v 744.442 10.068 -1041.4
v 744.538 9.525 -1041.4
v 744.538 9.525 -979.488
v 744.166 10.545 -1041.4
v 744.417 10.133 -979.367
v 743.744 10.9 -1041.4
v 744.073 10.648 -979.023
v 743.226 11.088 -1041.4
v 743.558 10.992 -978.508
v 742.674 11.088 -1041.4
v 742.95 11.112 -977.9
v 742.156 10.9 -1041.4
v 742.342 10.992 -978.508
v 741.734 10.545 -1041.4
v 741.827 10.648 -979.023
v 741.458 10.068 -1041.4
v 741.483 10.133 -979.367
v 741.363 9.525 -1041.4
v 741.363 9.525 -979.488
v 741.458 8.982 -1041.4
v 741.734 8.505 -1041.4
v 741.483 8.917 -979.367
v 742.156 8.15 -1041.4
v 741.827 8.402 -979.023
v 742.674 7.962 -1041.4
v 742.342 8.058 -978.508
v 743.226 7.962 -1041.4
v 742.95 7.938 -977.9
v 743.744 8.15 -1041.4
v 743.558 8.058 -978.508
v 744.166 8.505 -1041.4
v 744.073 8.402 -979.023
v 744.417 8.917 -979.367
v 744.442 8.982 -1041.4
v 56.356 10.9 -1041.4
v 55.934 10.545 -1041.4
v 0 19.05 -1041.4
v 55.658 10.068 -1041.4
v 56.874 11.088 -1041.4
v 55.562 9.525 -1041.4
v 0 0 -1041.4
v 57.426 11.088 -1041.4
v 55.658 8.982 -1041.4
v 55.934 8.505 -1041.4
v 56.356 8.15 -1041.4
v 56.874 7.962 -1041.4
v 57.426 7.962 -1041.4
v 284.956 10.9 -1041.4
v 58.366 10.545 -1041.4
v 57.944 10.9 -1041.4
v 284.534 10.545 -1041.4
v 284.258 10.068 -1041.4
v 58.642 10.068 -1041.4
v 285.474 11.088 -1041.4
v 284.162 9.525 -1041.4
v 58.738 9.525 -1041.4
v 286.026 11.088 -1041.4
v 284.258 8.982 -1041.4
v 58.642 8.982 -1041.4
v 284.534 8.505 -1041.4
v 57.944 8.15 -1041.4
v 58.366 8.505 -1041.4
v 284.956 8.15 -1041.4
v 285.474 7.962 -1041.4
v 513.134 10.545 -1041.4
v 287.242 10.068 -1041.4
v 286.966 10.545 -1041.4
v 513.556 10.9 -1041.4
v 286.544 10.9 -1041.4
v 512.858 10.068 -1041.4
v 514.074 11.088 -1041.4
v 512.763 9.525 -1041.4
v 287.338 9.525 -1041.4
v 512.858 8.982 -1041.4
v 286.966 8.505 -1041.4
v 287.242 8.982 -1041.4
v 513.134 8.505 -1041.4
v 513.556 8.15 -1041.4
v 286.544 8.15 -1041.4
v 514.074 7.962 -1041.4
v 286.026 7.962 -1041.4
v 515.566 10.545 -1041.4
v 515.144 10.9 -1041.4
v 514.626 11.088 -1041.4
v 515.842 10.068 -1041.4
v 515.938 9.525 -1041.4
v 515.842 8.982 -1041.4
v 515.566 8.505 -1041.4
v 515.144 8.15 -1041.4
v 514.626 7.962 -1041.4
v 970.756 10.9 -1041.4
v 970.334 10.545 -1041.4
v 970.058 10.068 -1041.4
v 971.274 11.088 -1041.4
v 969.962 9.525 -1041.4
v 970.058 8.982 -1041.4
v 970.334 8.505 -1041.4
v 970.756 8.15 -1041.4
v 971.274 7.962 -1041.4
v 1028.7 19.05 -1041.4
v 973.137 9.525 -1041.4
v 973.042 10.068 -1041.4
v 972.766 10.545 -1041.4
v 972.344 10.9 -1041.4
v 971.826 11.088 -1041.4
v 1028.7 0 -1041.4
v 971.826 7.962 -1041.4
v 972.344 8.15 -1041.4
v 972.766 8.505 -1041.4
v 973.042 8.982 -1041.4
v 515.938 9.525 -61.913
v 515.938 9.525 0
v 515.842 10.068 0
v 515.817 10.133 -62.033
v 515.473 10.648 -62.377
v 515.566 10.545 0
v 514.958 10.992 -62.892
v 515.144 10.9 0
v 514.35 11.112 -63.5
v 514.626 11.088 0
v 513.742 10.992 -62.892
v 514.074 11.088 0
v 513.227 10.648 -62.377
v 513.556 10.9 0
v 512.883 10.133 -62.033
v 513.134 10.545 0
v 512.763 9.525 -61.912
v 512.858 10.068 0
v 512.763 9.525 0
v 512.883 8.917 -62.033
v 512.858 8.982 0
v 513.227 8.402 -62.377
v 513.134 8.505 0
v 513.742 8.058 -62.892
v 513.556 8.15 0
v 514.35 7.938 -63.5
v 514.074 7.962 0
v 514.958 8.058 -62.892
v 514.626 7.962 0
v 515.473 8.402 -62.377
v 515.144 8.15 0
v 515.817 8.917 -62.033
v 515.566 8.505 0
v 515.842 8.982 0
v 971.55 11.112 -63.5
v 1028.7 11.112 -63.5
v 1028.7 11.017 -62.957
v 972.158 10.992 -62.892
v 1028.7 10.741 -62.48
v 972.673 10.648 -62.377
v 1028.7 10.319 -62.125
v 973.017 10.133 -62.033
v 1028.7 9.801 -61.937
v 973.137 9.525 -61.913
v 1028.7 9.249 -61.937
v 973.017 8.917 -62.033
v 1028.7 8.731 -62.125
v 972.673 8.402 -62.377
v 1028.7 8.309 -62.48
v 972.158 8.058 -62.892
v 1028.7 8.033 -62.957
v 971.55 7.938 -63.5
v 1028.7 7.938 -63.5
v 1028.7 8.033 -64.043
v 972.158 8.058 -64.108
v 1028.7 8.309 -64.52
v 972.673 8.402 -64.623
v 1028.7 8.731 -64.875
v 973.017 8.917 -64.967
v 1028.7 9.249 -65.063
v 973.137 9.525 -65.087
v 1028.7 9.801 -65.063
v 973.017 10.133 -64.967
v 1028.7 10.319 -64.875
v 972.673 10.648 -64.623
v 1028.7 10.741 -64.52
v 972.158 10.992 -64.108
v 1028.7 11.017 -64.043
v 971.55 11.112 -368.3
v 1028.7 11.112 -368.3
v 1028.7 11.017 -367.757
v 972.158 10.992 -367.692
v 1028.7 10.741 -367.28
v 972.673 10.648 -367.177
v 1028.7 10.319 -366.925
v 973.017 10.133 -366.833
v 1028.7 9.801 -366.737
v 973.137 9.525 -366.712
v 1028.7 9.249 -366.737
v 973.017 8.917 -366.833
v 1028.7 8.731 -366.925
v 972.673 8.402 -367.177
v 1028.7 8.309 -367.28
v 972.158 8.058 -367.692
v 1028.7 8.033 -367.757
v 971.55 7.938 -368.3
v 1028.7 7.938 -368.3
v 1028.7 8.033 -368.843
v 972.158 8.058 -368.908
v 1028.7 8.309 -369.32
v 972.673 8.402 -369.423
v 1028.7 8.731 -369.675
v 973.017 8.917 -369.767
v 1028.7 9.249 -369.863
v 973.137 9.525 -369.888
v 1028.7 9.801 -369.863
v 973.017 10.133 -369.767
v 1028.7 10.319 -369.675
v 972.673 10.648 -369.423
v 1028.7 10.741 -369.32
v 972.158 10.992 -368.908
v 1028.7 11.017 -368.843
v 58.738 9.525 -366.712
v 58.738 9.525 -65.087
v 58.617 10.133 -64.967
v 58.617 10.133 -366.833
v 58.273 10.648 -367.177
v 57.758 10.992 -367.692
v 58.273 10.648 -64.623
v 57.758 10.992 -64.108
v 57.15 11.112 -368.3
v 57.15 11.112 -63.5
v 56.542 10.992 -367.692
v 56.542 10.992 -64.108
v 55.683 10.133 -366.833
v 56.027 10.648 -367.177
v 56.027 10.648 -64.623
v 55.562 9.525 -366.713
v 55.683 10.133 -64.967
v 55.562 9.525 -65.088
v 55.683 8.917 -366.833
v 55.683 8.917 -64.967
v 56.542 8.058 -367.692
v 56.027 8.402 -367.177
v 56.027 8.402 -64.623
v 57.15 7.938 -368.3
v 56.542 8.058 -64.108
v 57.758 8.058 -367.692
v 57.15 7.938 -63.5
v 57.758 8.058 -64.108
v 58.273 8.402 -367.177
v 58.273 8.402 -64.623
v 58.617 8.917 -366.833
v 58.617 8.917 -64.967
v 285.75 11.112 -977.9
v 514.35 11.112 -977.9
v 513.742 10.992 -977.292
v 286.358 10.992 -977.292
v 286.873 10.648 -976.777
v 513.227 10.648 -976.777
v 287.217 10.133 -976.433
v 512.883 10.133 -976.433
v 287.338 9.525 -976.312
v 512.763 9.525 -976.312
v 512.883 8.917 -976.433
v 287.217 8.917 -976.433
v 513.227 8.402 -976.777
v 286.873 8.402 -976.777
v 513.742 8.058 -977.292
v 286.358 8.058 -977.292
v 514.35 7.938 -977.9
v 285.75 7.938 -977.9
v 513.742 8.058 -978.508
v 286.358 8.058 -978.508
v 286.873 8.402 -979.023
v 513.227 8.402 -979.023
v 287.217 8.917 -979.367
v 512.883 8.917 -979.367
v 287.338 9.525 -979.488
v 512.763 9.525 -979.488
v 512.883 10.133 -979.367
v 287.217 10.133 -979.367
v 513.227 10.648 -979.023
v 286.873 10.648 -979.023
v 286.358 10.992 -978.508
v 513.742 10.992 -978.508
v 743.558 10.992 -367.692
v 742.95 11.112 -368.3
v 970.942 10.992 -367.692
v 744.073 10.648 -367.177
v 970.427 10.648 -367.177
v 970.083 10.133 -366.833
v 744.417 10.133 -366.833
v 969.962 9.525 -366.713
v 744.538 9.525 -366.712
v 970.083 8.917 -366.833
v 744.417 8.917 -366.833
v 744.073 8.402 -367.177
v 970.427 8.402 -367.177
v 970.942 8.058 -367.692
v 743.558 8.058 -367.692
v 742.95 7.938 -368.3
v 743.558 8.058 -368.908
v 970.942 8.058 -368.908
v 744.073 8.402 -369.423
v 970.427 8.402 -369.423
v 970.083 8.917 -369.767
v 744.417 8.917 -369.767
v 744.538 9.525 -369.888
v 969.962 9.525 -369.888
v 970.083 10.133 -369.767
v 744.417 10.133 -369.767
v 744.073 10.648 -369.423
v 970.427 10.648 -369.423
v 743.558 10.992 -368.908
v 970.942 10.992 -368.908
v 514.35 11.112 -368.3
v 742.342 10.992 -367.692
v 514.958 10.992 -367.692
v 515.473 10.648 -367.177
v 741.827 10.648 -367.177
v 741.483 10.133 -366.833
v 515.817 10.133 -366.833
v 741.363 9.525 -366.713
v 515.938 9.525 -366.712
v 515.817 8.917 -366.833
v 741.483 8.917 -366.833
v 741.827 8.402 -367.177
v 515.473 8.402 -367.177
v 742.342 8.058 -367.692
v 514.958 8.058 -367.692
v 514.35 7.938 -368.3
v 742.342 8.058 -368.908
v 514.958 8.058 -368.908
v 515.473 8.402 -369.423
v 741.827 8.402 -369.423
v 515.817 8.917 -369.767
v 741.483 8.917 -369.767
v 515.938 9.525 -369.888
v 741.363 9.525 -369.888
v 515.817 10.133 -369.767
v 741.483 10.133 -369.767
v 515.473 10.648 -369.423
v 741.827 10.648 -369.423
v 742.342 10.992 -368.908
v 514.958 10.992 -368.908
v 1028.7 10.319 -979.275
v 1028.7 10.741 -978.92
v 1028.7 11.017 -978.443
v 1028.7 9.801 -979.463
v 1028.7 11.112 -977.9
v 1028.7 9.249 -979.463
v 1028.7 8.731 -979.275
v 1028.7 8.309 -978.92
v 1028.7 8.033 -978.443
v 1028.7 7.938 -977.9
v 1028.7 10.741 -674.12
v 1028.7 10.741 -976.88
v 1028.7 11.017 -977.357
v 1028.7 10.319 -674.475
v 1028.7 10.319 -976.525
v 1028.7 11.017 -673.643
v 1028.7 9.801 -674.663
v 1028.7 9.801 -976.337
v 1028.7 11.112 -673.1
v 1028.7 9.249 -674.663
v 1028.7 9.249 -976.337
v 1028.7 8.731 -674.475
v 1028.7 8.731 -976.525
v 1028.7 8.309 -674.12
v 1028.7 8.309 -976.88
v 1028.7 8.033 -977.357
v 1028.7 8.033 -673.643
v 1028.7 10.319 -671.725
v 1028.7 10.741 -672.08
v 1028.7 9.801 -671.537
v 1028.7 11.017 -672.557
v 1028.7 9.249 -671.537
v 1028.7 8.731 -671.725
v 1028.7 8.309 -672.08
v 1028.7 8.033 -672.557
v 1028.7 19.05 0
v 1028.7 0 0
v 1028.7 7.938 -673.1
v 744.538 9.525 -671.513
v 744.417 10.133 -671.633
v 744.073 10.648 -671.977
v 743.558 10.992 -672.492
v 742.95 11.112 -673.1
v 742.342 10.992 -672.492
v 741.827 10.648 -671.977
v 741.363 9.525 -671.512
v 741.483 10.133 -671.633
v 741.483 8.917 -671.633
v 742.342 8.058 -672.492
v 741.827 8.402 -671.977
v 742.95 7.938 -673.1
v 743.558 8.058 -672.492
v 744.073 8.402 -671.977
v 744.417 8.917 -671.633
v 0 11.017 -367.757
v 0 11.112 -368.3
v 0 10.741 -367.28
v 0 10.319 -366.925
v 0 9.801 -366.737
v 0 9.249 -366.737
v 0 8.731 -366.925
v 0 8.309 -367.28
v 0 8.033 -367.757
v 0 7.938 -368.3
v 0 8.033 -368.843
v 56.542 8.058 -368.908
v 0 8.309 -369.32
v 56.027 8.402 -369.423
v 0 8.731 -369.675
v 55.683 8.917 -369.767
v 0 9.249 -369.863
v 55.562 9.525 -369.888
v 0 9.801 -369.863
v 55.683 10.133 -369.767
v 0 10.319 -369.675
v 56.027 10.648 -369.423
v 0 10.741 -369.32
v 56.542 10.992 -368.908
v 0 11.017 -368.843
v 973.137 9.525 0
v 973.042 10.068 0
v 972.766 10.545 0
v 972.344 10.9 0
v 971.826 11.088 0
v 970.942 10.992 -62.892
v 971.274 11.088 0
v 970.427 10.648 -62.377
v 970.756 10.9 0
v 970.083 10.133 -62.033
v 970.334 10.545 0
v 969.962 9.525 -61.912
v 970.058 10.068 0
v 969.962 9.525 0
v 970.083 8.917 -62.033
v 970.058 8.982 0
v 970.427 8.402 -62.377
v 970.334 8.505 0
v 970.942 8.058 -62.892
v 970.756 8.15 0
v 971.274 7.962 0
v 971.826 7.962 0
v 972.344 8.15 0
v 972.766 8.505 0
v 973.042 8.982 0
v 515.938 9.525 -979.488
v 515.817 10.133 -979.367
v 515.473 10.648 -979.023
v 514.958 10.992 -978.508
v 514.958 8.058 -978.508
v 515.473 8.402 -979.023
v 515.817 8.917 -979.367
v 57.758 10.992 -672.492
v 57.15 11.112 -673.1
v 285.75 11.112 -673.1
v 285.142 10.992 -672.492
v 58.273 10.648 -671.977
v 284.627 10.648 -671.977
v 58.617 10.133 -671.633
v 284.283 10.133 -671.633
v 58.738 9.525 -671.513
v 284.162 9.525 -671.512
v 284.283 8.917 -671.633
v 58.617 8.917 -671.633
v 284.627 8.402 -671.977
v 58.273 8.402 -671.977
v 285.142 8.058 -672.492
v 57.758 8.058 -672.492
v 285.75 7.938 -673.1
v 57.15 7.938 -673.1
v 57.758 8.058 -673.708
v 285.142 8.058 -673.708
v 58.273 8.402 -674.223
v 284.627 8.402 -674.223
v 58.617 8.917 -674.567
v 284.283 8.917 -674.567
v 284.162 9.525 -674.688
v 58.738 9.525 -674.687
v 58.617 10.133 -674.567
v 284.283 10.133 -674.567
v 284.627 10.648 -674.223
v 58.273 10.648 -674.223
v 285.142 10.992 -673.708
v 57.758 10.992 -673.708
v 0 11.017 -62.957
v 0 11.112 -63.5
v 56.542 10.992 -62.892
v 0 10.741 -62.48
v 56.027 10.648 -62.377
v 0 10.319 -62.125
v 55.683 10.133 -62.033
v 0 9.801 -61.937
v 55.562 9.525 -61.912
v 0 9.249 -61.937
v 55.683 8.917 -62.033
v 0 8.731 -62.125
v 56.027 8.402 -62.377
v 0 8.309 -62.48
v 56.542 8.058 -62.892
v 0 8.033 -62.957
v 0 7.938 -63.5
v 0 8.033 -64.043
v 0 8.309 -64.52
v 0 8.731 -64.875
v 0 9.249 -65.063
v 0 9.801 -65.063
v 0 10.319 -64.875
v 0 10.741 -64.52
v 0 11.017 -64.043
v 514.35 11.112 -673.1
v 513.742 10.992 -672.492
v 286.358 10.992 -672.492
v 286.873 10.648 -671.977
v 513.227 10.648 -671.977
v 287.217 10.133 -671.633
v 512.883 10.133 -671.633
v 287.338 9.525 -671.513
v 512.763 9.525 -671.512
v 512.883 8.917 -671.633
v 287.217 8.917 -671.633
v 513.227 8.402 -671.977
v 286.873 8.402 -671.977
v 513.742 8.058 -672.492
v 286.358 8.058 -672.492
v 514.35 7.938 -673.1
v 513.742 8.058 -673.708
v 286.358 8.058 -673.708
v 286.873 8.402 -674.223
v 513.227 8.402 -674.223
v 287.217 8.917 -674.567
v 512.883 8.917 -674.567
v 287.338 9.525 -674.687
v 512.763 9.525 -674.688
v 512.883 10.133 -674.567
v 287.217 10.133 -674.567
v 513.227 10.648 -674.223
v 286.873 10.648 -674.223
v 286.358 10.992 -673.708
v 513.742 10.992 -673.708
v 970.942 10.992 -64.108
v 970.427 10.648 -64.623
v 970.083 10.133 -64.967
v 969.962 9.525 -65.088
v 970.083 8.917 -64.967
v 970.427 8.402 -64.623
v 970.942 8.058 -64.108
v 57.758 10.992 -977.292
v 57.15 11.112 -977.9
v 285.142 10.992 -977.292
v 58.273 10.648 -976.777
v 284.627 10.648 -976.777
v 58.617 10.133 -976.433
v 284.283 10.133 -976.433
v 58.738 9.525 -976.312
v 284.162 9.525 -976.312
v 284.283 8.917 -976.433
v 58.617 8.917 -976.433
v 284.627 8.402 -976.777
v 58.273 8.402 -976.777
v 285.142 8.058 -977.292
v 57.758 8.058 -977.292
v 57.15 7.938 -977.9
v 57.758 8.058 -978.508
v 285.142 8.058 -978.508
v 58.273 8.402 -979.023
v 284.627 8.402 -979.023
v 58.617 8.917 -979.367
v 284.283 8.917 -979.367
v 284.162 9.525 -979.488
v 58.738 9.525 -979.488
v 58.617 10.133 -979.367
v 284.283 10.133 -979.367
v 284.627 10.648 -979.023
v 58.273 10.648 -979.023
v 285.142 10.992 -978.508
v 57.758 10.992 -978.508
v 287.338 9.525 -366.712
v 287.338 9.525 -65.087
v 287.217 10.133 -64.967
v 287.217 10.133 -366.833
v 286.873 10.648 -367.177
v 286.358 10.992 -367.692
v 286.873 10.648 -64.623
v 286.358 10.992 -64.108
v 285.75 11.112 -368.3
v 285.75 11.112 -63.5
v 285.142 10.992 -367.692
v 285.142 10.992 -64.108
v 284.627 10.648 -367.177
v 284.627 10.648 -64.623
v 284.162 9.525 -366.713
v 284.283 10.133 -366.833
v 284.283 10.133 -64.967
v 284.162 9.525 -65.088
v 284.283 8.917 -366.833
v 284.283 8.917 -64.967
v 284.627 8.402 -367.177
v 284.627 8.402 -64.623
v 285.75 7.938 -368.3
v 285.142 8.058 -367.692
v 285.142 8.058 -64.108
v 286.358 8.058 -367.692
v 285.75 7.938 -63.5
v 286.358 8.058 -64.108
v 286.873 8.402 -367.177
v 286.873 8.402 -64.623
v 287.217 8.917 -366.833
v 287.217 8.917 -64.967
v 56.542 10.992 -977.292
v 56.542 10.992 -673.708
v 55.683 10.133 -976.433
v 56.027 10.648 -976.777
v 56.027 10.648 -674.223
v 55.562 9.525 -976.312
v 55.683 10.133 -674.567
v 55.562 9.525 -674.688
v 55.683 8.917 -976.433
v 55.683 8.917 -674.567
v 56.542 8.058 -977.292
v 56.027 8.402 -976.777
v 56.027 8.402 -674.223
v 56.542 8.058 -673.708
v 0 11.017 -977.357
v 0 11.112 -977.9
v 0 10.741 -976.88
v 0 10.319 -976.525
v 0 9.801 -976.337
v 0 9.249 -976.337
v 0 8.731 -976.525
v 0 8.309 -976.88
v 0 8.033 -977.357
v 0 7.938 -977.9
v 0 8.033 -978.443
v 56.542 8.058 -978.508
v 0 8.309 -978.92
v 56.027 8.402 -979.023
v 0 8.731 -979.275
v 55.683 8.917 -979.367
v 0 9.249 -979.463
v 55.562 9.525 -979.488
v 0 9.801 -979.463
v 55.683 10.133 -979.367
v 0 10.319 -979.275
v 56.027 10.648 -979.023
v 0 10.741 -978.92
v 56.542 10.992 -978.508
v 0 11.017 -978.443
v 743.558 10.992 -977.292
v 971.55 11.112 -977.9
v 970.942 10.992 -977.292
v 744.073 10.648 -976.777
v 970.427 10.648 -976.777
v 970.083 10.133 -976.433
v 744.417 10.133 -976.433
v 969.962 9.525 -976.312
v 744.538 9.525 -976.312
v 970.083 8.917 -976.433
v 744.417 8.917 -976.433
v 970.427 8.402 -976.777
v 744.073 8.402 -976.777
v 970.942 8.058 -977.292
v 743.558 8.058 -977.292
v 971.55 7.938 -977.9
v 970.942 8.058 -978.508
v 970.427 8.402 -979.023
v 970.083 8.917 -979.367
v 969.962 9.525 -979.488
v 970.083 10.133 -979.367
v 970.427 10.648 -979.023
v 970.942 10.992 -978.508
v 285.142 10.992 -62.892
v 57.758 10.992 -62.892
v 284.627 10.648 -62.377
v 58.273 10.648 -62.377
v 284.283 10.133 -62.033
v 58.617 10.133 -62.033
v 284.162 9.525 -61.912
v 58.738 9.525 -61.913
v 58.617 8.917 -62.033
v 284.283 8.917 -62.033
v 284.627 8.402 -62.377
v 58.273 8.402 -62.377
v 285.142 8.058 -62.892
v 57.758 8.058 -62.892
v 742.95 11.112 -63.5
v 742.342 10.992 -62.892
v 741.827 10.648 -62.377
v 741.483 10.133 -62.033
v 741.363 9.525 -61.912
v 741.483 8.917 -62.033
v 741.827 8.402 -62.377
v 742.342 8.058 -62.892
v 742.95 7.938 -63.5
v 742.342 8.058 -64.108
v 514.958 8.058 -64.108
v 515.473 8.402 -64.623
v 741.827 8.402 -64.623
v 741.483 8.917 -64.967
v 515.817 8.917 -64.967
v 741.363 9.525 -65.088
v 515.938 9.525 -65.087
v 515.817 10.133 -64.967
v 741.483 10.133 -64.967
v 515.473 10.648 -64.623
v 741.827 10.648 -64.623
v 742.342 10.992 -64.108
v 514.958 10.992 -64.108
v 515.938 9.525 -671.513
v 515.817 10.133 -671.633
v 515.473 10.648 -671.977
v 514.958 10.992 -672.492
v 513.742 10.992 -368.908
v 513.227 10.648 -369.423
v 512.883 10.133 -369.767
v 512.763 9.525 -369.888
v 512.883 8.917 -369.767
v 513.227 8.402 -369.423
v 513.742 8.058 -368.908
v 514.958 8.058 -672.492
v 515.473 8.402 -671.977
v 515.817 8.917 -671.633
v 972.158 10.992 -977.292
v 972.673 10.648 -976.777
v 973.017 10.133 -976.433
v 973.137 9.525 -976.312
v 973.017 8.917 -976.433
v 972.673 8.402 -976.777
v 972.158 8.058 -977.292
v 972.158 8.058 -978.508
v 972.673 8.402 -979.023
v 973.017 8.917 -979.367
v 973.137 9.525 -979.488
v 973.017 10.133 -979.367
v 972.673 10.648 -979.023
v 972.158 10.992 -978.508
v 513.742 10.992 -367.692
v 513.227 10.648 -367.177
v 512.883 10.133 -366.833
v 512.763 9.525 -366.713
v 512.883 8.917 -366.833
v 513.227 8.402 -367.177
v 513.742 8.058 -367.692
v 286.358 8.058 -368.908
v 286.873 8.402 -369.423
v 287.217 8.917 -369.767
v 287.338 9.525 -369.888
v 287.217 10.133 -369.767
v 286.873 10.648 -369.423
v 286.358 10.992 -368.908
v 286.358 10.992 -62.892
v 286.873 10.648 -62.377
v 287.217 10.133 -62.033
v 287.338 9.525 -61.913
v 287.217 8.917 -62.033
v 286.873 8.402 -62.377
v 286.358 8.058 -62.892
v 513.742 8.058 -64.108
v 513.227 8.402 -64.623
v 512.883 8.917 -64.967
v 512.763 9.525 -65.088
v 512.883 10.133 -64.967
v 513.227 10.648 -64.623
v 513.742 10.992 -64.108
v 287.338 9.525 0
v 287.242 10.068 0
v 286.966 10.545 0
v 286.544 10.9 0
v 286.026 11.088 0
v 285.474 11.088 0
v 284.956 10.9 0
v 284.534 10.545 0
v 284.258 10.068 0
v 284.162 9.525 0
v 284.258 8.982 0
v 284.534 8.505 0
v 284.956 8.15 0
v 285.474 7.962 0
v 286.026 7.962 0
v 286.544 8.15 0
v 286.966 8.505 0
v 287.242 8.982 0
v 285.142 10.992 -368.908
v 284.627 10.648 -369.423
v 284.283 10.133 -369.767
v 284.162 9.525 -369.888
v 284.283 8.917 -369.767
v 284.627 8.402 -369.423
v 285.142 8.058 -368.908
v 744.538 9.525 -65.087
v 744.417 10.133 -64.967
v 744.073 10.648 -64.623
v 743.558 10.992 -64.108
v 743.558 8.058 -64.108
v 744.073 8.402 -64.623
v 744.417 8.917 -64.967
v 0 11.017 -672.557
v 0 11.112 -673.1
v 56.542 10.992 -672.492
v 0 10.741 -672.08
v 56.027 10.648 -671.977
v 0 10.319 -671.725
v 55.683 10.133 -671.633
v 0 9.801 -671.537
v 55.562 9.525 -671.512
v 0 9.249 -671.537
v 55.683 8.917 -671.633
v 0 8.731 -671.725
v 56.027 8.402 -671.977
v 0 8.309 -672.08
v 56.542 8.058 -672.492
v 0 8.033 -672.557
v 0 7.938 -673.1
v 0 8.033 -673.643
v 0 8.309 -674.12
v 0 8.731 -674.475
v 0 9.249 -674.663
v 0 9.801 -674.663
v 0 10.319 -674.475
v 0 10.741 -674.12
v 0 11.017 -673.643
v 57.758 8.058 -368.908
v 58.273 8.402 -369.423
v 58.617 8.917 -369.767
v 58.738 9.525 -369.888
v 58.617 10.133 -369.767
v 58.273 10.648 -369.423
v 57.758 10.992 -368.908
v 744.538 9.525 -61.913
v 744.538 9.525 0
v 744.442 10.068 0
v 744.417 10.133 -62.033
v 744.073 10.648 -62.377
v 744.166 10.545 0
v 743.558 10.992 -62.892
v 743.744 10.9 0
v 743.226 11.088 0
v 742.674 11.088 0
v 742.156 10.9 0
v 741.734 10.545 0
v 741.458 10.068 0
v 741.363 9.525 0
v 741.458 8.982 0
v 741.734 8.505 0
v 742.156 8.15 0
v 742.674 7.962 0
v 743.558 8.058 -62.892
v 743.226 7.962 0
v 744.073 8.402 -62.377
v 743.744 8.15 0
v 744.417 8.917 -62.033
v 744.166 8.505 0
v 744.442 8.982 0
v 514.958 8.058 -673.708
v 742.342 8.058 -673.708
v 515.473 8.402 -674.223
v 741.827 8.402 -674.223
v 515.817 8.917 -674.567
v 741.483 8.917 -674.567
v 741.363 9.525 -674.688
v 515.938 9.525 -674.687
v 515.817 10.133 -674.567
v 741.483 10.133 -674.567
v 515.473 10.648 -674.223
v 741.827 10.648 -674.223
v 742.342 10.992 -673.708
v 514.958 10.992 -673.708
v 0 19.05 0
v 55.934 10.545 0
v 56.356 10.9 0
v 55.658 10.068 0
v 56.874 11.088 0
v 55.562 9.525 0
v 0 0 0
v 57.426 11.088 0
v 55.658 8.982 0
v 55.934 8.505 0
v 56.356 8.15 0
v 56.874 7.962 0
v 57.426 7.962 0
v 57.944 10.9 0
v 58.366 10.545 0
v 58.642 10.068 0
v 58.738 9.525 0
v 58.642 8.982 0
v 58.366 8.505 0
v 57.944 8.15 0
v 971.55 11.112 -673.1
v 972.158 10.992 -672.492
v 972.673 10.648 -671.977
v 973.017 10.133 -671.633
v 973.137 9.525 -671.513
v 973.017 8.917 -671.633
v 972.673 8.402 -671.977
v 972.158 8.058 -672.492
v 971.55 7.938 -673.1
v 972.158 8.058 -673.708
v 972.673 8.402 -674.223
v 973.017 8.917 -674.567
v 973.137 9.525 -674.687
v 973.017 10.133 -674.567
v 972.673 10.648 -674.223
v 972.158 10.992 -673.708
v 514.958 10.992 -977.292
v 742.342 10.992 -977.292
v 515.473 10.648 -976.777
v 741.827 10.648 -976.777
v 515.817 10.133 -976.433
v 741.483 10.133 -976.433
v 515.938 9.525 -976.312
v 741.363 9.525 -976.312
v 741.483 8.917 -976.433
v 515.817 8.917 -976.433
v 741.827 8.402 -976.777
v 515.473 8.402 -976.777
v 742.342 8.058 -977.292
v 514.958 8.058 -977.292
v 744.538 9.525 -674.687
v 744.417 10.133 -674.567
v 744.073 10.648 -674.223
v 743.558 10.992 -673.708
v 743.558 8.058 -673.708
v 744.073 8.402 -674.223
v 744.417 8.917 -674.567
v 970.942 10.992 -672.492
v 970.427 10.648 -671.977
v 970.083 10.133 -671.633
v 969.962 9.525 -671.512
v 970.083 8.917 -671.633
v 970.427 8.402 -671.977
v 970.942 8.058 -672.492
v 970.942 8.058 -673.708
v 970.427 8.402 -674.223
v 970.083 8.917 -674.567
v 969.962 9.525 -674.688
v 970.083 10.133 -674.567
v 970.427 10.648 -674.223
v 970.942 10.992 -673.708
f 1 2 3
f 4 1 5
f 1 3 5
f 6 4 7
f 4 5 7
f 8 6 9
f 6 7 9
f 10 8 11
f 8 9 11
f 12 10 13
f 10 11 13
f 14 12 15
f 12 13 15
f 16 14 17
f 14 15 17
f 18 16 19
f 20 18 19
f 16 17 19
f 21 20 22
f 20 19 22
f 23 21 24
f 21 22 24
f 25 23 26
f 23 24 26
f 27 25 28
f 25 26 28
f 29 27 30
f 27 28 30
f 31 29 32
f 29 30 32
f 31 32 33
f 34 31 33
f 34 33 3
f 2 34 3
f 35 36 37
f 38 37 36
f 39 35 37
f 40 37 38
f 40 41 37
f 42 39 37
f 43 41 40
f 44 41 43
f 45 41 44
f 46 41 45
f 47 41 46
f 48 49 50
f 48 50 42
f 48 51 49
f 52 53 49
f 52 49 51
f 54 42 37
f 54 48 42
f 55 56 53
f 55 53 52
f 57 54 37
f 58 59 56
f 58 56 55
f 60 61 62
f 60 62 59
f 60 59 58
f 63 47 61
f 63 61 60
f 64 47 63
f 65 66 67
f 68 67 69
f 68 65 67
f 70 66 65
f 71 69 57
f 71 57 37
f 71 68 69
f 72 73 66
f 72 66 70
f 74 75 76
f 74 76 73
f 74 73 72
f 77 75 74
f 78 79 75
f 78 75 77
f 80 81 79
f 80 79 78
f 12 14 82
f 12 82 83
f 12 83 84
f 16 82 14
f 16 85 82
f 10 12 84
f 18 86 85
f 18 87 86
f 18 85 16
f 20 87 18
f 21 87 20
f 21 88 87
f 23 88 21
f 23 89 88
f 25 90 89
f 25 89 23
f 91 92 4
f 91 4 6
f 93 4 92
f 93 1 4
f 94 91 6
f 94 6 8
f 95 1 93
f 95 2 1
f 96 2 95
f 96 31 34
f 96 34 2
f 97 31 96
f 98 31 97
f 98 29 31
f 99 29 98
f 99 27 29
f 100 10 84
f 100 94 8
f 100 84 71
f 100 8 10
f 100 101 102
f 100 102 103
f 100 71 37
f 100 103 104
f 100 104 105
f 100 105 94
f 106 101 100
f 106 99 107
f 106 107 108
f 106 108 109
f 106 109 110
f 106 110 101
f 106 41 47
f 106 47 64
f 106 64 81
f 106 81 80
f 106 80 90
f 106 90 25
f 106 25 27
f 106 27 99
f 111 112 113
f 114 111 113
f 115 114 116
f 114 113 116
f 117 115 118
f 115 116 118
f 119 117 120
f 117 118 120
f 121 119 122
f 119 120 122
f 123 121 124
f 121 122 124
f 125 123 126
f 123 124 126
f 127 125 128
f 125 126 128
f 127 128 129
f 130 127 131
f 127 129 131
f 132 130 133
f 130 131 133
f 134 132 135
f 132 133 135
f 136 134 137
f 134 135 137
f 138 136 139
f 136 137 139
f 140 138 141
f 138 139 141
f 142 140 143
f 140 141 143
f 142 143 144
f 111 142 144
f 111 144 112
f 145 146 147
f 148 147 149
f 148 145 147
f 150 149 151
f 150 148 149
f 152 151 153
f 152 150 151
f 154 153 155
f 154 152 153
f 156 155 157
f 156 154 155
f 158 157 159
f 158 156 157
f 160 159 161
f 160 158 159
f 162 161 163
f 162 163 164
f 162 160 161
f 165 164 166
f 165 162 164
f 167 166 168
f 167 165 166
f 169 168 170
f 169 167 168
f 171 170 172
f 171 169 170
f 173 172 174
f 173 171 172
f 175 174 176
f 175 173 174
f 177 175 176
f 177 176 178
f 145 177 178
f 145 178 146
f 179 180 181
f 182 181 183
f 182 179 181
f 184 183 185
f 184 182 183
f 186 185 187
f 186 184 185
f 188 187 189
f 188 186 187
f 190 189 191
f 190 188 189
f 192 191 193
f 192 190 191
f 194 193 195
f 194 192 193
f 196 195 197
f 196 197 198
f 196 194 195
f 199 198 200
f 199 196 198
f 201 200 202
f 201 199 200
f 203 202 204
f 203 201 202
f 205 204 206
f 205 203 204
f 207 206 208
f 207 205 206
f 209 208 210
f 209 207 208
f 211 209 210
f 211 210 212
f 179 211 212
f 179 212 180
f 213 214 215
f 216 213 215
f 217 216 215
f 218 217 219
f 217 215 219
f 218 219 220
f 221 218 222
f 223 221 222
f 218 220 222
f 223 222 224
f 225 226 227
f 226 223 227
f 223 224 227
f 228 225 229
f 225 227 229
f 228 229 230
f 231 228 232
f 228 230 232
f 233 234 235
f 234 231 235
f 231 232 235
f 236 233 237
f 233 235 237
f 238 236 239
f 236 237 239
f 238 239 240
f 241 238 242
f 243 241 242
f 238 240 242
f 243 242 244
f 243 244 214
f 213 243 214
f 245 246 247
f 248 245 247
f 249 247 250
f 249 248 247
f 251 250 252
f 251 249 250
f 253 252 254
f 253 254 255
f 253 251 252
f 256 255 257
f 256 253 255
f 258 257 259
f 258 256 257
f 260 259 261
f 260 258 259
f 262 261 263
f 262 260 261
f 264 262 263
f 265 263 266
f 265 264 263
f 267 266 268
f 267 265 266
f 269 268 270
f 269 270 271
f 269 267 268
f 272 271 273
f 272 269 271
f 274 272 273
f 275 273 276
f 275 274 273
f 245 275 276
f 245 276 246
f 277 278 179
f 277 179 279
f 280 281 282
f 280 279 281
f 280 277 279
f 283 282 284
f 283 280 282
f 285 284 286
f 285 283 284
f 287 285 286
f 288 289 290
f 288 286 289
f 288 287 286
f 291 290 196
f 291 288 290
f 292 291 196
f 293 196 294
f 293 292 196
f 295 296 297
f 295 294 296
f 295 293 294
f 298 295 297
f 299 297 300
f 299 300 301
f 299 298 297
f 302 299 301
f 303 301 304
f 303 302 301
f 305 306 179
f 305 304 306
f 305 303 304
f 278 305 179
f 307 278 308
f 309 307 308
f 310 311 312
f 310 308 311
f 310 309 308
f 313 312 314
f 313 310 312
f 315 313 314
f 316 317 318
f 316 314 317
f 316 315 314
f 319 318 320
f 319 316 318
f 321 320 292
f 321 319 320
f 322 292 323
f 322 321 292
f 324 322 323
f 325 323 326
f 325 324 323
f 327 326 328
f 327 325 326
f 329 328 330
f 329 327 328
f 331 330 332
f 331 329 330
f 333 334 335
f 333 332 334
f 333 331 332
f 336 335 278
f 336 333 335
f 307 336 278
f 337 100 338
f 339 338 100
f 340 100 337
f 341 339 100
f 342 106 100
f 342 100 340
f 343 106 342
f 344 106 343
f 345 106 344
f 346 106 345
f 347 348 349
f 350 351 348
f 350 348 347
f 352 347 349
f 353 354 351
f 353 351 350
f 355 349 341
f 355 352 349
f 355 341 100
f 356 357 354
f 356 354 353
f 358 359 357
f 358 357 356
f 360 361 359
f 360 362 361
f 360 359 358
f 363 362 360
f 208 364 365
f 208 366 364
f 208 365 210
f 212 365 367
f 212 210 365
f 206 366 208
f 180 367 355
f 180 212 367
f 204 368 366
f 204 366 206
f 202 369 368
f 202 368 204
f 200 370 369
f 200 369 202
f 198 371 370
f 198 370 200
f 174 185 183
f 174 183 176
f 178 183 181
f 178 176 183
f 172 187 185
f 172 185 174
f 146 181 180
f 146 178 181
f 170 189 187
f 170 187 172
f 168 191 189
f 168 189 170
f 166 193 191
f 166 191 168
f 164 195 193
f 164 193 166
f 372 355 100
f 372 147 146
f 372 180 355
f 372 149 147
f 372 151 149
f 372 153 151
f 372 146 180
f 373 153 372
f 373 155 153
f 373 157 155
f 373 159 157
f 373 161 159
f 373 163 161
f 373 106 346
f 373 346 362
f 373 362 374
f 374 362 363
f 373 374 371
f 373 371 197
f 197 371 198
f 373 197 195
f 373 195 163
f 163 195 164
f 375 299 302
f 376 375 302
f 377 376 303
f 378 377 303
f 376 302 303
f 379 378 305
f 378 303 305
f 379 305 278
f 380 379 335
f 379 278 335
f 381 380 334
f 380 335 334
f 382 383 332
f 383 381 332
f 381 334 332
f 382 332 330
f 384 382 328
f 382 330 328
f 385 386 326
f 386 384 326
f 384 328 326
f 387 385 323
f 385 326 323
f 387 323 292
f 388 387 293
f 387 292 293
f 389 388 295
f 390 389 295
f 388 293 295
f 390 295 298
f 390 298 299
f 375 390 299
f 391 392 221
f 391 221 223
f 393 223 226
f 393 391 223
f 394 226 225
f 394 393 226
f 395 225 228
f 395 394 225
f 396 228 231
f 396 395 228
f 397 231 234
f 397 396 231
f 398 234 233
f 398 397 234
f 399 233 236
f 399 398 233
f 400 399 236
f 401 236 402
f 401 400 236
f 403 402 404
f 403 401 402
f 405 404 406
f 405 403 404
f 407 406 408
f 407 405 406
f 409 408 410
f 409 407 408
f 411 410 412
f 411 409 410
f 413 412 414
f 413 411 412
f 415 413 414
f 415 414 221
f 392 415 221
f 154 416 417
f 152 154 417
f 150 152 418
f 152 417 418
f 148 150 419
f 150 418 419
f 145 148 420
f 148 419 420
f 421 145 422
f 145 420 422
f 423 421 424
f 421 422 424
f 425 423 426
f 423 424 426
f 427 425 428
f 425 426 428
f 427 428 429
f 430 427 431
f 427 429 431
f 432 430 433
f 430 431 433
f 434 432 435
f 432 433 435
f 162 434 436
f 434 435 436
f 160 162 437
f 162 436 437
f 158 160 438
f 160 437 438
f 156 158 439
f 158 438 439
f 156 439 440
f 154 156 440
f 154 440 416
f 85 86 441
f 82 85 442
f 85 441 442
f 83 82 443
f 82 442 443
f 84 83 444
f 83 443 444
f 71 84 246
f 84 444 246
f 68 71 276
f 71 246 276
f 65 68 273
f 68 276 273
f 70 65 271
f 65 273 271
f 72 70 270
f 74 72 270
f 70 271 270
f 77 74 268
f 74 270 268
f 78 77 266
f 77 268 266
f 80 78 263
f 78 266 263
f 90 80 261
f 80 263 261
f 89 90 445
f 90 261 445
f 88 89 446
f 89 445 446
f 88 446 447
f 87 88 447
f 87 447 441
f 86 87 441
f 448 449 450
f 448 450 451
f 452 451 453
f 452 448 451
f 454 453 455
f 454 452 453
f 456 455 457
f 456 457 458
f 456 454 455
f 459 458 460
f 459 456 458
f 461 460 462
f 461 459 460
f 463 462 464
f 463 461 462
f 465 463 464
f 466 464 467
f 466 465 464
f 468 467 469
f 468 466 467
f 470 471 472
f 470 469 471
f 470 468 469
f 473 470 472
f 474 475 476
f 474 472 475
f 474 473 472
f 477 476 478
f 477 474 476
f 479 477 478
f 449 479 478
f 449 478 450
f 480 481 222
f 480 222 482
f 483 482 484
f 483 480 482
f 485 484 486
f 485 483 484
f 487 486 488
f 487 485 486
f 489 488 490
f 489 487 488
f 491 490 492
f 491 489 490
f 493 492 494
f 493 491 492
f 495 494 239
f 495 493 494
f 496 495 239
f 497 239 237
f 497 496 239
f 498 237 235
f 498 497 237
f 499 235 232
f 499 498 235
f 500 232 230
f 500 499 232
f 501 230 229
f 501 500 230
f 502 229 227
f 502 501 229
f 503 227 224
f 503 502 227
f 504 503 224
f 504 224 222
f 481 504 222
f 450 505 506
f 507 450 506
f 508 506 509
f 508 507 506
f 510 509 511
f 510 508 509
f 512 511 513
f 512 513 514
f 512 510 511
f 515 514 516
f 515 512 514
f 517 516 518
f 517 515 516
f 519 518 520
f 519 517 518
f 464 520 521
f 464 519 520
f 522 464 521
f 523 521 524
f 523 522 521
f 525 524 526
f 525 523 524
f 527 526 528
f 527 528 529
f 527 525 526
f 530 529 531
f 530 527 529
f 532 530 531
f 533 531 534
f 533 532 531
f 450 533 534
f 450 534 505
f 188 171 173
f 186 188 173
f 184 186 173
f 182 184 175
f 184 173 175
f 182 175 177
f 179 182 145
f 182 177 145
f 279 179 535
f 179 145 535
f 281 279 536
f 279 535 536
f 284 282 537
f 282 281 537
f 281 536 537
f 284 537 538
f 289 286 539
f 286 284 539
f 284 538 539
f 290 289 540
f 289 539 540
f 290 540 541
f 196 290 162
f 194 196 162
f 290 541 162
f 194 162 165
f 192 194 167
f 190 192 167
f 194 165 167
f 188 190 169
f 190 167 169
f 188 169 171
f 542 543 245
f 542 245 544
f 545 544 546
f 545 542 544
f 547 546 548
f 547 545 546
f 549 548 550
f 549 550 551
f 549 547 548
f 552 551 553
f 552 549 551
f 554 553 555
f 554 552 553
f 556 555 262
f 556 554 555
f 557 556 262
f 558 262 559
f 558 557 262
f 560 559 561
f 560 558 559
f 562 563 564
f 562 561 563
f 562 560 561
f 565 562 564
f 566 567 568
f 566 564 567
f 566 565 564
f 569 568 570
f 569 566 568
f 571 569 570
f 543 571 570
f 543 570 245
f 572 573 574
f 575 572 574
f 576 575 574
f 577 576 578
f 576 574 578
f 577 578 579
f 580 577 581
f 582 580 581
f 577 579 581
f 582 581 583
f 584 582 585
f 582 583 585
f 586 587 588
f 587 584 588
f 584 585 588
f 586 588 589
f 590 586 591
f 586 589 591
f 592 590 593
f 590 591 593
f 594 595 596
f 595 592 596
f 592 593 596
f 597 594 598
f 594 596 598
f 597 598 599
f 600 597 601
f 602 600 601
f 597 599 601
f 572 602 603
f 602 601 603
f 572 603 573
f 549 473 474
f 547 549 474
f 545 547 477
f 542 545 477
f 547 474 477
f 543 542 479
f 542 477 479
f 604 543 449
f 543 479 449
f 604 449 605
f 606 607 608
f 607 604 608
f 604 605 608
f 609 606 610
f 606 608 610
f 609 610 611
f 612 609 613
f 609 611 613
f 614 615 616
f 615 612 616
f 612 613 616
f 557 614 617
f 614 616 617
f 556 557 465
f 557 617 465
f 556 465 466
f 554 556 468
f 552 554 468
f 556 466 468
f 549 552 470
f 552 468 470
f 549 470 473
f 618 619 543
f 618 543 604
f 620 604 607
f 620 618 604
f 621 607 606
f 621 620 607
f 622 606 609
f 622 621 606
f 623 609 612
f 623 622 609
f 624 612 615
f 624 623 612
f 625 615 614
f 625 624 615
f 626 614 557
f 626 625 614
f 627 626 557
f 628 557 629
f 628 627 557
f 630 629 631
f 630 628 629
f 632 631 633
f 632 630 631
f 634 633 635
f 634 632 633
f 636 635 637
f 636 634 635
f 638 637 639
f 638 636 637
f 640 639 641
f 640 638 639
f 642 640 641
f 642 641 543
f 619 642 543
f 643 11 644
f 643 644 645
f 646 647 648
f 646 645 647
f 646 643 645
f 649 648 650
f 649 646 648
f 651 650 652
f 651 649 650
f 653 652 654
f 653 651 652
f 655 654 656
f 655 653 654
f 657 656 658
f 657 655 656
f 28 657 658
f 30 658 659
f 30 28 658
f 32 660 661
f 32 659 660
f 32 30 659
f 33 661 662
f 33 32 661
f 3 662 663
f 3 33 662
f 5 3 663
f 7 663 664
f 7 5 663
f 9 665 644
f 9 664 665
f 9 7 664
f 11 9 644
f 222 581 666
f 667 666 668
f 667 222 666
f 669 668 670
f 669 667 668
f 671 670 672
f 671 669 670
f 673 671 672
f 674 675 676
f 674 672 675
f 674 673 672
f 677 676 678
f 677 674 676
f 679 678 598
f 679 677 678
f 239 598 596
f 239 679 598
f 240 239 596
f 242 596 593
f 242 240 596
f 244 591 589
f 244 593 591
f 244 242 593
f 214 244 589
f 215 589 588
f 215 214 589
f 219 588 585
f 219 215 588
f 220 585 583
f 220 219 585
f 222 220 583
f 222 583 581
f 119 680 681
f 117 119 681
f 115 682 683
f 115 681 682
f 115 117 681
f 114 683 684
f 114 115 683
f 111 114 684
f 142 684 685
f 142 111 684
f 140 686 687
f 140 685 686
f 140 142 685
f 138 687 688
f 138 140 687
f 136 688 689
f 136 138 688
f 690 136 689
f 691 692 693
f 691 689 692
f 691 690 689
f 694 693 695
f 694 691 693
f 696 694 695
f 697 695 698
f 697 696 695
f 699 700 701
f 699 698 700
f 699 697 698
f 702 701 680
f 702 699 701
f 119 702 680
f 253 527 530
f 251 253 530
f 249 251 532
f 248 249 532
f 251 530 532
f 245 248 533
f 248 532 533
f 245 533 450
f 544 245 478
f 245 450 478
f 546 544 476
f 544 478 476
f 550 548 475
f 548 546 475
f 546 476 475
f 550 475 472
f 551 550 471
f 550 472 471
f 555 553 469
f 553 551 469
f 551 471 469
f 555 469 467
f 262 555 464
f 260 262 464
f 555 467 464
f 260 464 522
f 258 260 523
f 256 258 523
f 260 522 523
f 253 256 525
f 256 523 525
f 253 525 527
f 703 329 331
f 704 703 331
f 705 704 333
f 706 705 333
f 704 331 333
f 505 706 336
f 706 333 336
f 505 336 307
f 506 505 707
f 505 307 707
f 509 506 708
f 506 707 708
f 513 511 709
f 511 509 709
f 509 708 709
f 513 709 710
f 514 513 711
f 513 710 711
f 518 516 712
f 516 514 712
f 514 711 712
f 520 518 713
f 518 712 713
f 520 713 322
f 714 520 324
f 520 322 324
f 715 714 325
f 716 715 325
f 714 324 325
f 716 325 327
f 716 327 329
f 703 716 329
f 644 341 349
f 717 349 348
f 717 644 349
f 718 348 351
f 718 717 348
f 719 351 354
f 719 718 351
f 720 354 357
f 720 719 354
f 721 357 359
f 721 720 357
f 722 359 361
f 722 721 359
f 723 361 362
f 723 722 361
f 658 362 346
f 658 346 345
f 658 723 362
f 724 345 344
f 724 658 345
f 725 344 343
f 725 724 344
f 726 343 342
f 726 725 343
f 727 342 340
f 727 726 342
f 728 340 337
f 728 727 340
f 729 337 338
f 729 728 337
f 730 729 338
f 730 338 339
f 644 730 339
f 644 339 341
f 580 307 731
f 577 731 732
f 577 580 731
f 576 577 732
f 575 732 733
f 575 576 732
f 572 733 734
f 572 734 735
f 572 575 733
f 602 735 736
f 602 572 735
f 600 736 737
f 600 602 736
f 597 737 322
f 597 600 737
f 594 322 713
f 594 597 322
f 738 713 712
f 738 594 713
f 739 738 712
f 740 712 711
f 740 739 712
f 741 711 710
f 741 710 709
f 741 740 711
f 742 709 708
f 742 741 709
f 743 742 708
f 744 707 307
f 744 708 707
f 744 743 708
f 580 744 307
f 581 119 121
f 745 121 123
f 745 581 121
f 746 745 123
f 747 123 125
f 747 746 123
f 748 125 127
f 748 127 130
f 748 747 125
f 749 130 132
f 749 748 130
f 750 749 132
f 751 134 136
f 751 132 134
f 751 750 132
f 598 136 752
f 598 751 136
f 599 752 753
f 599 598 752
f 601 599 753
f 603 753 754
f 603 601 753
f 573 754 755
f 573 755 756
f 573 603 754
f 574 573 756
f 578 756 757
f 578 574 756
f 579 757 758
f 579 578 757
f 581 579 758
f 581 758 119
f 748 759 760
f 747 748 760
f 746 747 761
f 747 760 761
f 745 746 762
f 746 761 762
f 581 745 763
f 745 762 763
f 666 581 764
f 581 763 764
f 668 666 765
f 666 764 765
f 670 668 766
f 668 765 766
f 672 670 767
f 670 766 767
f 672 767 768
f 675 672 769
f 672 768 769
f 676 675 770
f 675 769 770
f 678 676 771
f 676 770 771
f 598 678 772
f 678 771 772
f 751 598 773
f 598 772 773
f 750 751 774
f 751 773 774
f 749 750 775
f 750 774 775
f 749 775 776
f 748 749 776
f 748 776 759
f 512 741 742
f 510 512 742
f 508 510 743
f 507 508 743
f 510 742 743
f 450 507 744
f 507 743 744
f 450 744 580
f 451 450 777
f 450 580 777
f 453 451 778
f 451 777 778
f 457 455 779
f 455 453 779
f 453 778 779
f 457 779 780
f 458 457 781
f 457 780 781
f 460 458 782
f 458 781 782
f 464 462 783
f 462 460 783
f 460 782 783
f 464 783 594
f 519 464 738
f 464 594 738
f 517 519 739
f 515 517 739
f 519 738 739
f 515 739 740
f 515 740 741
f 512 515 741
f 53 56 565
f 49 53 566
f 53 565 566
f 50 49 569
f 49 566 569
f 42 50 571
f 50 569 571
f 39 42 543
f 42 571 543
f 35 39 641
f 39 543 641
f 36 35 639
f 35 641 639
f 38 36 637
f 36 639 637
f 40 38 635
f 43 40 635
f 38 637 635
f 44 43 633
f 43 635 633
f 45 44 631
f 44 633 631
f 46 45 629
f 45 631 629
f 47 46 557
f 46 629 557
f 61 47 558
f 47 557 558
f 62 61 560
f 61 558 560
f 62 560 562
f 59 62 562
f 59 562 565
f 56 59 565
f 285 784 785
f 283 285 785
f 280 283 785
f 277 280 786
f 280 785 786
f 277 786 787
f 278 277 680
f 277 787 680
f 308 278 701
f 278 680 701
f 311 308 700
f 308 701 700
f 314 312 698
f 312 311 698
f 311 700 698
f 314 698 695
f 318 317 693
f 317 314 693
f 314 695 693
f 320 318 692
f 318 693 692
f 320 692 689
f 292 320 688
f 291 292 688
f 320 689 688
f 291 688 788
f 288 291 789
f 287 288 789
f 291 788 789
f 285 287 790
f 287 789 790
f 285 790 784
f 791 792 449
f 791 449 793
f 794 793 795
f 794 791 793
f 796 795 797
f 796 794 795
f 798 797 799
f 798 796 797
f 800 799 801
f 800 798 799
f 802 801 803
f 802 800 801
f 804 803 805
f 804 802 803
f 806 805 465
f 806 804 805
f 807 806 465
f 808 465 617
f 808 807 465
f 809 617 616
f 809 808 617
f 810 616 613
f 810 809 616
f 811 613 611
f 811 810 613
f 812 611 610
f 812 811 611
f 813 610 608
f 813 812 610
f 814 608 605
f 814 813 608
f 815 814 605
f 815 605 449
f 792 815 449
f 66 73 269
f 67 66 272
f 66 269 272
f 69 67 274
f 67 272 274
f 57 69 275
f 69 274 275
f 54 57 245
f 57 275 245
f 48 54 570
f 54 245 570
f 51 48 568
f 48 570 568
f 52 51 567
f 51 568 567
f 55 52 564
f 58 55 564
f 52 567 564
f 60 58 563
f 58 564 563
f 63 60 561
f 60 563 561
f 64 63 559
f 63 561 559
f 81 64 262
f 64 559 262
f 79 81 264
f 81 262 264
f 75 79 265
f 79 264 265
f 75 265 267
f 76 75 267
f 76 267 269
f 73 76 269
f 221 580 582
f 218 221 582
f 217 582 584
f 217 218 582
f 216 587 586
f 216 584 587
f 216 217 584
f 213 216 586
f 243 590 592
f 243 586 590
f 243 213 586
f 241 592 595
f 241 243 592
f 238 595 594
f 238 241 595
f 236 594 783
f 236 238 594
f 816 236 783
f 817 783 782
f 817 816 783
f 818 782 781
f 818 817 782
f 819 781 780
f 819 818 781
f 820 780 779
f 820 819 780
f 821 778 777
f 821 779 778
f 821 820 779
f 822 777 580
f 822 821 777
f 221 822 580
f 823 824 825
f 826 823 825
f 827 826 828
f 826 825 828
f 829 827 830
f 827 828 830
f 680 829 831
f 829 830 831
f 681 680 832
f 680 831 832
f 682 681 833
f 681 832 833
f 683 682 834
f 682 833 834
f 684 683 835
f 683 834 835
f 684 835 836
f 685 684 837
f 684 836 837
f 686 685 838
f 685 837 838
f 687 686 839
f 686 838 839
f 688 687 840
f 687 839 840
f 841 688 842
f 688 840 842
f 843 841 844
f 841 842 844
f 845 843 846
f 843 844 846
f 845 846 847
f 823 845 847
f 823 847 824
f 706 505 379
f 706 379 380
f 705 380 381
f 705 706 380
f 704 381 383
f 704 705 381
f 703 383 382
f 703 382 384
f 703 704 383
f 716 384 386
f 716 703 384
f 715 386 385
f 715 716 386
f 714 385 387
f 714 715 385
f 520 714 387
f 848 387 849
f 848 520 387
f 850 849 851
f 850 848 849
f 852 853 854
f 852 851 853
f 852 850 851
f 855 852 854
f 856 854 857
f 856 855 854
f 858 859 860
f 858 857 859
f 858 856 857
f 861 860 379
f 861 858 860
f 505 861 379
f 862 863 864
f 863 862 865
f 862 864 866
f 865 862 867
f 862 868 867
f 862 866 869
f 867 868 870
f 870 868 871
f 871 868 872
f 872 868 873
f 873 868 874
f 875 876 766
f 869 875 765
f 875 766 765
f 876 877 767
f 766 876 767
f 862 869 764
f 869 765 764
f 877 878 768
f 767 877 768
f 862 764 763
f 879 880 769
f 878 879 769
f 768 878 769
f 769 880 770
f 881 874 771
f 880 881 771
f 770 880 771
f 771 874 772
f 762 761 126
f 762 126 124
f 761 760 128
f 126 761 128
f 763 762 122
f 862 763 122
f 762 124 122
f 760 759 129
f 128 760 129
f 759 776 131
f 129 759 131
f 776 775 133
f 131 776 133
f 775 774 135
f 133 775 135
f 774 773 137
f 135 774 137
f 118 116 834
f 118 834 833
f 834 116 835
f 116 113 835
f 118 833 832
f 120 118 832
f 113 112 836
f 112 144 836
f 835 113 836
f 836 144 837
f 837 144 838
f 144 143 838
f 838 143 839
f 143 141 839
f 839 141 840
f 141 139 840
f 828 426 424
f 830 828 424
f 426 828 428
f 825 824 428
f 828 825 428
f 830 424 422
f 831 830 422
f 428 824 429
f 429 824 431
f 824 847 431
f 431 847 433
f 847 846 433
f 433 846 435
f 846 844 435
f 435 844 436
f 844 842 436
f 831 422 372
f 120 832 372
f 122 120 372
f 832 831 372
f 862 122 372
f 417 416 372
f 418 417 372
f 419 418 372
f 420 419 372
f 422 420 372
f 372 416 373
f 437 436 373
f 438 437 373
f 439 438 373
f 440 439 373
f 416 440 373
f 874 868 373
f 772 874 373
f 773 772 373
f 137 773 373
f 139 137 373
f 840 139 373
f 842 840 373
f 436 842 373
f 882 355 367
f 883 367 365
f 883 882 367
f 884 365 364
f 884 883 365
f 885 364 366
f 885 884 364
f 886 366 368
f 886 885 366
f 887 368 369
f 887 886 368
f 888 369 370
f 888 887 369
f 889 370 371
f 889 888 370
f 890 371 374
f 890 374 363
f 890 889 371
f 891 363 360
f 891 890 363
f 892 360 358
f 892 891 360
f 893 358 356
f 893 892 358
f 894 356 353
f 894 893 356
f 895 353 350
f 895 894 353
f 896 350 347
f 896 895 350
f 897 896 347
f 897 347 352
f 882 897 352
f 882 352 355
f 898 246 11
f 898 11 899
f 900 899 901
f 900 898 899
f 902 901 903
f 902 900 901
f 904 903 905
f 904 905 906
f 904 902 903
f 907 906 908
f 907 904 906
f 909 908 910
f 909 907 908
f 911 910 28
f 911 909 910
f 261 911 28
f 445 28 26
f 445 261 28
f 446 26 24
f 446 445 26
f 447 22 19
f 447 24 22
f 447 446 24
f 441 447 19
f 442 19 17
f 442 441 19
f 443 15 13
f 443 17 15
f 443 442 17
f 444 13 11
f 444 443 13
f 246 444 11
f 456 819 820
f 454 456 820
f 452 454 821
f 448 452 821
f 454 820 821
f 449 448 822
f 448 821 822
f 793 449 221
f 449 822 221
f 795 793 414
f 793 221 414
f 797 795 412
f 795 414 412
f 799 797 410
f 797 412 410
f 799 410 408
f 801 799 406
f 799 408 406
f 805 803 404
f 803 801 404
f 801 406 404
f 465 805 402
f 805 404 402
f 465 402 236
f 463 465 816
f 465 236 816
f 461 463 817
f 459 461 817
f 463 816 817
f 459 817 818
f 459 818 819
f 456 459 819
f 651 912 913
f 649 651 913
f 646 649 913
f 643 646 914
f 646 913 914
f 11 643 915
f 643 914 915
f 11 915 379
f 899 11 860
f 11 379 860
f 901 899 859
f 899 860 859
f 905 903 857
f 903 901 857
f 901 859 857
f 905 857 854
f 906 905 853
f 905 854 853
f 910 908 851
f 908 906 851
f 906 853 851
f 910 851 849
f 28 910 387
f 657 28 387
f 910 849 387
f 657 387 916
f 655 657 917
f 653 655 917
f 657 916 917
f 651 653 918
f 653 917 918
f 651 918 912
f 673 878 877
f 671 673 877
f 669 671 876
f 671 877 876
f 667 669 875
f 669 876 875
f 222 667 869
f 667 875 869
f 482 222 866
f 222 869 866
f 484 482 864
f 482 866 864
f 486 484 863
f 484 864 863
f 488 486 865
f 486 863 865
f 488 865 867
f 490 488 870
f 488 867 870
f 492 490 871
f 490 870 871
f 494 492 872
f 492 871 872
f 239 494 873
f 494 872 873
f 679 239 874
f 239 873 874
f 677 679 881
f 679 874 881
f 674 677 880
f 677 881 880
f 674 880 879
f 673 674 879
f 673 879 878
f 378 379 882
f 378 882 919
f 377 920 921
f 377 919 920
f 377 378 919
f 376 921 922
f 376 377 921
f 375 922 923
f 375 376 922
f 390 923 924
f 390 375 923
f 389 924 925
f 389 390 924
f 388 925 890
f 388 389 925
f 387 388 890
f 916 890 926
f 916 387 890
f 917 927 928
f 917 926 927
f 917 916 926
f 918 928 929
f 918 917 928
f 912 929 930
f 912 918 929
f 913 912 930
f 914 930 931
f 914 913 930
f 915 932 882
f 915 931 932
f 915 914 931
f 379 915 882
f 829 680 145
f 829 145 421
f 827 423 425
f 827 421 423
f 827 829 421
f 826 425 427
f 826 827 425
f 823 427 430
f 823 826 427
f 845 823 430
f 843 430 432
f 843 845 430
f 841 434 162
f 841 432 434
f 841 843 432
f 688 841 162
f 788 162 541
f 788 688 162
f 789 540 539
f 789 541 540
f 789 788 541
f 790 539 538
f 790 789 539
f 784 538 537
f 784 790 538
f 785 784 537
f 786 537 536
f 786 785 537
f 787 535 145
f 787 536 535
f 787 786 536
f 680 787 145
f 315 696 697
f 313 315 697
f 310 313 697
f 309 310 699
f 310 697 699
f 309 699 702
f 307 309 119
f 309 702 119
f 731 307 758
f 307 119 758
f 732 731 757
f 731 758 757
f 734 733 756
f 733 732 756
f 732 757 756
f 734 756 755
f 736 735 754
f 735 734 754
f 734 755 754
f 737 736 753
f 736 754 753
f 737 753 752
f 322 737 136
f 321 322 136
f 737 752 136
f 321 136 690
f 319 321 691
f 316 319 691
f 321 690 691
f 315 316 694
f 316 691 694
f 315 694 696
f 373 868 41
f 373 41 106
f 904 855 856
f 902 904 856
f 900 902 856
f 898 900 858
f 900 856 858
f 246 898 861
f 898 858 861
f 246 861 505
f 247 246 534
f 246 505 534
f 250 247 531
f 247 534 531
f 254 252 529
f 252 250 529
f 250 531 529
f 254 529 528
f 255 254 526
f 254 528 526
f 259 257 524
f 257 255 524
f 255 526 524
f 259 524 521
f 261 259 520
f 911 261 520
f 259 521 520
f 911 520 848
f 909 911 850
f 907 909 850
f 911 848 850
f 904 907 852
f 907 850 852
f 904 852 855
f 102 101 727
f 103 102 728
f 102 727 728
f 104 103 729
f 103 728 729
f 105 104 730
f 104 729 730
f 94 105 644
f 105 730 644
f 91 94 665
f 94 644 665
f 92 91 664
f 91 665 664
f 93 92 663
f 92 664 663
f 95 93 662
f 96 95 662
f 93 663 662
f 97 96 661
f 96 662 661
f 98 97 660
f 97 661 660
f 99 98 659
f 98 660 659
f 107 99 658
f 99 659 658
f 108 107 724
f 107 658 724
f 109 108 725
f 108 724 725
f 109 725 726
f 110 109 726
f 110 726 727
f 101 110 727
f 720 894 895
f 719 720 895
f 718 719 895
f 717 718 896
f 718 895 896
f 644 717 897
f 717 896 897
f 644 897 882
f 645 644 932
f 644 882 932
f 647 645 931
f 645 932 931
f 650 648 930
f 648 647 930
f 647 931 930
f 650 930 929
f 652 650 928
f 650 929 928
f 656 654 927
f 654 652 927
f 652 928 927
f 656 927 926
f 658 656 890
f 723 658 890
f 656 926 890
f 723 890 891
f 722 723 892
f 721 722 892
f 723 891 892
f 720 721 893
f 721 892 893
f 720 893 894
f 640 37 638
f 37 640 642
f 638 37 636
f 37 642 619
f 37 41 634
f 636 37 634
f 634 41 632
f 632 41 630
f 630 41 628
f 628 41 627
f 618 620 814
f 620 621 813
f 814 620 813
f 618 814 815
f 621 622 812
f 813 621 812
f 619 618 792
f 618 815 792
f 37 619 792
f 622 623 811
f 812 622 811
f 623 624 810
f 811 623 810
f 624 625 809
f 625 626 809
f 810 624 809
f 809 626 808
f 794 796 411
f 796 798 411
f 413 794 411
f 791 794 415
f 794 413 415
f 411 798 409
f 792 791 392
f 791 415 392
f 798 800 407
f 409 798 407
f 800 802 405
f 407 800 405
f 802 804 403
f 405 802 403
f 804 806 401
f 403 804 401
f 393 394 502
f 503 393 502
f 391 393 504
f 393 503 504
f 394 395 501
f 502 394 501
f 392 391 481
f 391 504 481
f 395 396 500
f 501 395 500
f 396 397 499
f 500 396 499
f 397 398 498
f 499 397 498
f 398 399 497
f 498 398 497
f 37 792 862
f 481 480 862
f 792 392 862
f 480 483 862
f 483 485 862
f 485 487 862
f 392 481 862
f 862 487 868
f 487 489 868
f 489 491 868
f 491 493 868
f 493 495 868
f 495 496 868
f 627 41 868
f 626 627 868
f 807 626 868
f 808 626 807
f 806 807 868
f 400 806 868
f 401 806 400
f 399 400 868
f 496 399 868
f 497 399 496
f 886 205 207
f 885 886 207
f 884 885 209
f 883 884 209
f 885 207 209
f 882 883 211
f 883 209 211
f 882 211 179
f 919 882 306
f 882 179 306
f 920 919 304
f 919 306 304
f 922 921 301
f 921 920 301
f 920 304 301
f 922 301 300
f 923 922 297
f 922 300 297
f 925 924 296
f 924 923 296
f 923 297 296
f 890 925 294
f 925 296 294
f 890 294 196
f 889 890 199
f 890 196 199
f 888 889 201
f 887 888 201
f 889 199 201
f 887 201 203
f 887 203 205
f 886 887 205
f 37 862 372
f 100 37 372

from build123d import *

# Parameters (mm, degrees)
F0_W     = 1028.7
F0_H     = 1041.4
F1_DEPTH = 19.05
F2_R     = 1.5875
F3_DEPTH = 1028.7
F4_R     = 1.5875
F5_DEPTH = 1041.401


with BuildPart() as f1:
    # F0 (on Front) → F1 (new body)
    with BuildSketch(Plane.XZ):
        with Locations((514.35, -520.7)):
            Rectangle(F0_W, F0_H)
    extrude(amount=-F1_DEPTH)

    # F2 (on Right) → F3 (cut)
    with BuildSketch(Plane.YZ):
        with Locations((9.525, -63.5)):
            Circle(F2_R)
        with Locations((9.525, -368.3)):
            Circle(F2_R)
        with Locations((9.525, -673.1)):
            Circle(F2_R)
        with Locations((9.525, -977.9)):
            Circle(F2_R)
    extrude(amount=F3_DEPTH, mode=Mode.SUBTRACT)

    # F4 (on Top) → F5 (cut, through all)
    with BuildSketch(Plane.XY):
        with Locations((57.15, 9.525)):
            Circle(F4_R)
        with Locations((285.75, 9.525)):
            Circle(F4_R)
        with Locations((514.35, 9.525)):
            Circle(F4_R)
        with Locations((742.95, 9.525)):
            Circle(F4_R)
        with Locations((971.55, 9.525)):
            Circle(F4_R)
    extrude(amount=-F5_DEPTH, mode=Mode.SUBTRACT)


solid = f1.part
